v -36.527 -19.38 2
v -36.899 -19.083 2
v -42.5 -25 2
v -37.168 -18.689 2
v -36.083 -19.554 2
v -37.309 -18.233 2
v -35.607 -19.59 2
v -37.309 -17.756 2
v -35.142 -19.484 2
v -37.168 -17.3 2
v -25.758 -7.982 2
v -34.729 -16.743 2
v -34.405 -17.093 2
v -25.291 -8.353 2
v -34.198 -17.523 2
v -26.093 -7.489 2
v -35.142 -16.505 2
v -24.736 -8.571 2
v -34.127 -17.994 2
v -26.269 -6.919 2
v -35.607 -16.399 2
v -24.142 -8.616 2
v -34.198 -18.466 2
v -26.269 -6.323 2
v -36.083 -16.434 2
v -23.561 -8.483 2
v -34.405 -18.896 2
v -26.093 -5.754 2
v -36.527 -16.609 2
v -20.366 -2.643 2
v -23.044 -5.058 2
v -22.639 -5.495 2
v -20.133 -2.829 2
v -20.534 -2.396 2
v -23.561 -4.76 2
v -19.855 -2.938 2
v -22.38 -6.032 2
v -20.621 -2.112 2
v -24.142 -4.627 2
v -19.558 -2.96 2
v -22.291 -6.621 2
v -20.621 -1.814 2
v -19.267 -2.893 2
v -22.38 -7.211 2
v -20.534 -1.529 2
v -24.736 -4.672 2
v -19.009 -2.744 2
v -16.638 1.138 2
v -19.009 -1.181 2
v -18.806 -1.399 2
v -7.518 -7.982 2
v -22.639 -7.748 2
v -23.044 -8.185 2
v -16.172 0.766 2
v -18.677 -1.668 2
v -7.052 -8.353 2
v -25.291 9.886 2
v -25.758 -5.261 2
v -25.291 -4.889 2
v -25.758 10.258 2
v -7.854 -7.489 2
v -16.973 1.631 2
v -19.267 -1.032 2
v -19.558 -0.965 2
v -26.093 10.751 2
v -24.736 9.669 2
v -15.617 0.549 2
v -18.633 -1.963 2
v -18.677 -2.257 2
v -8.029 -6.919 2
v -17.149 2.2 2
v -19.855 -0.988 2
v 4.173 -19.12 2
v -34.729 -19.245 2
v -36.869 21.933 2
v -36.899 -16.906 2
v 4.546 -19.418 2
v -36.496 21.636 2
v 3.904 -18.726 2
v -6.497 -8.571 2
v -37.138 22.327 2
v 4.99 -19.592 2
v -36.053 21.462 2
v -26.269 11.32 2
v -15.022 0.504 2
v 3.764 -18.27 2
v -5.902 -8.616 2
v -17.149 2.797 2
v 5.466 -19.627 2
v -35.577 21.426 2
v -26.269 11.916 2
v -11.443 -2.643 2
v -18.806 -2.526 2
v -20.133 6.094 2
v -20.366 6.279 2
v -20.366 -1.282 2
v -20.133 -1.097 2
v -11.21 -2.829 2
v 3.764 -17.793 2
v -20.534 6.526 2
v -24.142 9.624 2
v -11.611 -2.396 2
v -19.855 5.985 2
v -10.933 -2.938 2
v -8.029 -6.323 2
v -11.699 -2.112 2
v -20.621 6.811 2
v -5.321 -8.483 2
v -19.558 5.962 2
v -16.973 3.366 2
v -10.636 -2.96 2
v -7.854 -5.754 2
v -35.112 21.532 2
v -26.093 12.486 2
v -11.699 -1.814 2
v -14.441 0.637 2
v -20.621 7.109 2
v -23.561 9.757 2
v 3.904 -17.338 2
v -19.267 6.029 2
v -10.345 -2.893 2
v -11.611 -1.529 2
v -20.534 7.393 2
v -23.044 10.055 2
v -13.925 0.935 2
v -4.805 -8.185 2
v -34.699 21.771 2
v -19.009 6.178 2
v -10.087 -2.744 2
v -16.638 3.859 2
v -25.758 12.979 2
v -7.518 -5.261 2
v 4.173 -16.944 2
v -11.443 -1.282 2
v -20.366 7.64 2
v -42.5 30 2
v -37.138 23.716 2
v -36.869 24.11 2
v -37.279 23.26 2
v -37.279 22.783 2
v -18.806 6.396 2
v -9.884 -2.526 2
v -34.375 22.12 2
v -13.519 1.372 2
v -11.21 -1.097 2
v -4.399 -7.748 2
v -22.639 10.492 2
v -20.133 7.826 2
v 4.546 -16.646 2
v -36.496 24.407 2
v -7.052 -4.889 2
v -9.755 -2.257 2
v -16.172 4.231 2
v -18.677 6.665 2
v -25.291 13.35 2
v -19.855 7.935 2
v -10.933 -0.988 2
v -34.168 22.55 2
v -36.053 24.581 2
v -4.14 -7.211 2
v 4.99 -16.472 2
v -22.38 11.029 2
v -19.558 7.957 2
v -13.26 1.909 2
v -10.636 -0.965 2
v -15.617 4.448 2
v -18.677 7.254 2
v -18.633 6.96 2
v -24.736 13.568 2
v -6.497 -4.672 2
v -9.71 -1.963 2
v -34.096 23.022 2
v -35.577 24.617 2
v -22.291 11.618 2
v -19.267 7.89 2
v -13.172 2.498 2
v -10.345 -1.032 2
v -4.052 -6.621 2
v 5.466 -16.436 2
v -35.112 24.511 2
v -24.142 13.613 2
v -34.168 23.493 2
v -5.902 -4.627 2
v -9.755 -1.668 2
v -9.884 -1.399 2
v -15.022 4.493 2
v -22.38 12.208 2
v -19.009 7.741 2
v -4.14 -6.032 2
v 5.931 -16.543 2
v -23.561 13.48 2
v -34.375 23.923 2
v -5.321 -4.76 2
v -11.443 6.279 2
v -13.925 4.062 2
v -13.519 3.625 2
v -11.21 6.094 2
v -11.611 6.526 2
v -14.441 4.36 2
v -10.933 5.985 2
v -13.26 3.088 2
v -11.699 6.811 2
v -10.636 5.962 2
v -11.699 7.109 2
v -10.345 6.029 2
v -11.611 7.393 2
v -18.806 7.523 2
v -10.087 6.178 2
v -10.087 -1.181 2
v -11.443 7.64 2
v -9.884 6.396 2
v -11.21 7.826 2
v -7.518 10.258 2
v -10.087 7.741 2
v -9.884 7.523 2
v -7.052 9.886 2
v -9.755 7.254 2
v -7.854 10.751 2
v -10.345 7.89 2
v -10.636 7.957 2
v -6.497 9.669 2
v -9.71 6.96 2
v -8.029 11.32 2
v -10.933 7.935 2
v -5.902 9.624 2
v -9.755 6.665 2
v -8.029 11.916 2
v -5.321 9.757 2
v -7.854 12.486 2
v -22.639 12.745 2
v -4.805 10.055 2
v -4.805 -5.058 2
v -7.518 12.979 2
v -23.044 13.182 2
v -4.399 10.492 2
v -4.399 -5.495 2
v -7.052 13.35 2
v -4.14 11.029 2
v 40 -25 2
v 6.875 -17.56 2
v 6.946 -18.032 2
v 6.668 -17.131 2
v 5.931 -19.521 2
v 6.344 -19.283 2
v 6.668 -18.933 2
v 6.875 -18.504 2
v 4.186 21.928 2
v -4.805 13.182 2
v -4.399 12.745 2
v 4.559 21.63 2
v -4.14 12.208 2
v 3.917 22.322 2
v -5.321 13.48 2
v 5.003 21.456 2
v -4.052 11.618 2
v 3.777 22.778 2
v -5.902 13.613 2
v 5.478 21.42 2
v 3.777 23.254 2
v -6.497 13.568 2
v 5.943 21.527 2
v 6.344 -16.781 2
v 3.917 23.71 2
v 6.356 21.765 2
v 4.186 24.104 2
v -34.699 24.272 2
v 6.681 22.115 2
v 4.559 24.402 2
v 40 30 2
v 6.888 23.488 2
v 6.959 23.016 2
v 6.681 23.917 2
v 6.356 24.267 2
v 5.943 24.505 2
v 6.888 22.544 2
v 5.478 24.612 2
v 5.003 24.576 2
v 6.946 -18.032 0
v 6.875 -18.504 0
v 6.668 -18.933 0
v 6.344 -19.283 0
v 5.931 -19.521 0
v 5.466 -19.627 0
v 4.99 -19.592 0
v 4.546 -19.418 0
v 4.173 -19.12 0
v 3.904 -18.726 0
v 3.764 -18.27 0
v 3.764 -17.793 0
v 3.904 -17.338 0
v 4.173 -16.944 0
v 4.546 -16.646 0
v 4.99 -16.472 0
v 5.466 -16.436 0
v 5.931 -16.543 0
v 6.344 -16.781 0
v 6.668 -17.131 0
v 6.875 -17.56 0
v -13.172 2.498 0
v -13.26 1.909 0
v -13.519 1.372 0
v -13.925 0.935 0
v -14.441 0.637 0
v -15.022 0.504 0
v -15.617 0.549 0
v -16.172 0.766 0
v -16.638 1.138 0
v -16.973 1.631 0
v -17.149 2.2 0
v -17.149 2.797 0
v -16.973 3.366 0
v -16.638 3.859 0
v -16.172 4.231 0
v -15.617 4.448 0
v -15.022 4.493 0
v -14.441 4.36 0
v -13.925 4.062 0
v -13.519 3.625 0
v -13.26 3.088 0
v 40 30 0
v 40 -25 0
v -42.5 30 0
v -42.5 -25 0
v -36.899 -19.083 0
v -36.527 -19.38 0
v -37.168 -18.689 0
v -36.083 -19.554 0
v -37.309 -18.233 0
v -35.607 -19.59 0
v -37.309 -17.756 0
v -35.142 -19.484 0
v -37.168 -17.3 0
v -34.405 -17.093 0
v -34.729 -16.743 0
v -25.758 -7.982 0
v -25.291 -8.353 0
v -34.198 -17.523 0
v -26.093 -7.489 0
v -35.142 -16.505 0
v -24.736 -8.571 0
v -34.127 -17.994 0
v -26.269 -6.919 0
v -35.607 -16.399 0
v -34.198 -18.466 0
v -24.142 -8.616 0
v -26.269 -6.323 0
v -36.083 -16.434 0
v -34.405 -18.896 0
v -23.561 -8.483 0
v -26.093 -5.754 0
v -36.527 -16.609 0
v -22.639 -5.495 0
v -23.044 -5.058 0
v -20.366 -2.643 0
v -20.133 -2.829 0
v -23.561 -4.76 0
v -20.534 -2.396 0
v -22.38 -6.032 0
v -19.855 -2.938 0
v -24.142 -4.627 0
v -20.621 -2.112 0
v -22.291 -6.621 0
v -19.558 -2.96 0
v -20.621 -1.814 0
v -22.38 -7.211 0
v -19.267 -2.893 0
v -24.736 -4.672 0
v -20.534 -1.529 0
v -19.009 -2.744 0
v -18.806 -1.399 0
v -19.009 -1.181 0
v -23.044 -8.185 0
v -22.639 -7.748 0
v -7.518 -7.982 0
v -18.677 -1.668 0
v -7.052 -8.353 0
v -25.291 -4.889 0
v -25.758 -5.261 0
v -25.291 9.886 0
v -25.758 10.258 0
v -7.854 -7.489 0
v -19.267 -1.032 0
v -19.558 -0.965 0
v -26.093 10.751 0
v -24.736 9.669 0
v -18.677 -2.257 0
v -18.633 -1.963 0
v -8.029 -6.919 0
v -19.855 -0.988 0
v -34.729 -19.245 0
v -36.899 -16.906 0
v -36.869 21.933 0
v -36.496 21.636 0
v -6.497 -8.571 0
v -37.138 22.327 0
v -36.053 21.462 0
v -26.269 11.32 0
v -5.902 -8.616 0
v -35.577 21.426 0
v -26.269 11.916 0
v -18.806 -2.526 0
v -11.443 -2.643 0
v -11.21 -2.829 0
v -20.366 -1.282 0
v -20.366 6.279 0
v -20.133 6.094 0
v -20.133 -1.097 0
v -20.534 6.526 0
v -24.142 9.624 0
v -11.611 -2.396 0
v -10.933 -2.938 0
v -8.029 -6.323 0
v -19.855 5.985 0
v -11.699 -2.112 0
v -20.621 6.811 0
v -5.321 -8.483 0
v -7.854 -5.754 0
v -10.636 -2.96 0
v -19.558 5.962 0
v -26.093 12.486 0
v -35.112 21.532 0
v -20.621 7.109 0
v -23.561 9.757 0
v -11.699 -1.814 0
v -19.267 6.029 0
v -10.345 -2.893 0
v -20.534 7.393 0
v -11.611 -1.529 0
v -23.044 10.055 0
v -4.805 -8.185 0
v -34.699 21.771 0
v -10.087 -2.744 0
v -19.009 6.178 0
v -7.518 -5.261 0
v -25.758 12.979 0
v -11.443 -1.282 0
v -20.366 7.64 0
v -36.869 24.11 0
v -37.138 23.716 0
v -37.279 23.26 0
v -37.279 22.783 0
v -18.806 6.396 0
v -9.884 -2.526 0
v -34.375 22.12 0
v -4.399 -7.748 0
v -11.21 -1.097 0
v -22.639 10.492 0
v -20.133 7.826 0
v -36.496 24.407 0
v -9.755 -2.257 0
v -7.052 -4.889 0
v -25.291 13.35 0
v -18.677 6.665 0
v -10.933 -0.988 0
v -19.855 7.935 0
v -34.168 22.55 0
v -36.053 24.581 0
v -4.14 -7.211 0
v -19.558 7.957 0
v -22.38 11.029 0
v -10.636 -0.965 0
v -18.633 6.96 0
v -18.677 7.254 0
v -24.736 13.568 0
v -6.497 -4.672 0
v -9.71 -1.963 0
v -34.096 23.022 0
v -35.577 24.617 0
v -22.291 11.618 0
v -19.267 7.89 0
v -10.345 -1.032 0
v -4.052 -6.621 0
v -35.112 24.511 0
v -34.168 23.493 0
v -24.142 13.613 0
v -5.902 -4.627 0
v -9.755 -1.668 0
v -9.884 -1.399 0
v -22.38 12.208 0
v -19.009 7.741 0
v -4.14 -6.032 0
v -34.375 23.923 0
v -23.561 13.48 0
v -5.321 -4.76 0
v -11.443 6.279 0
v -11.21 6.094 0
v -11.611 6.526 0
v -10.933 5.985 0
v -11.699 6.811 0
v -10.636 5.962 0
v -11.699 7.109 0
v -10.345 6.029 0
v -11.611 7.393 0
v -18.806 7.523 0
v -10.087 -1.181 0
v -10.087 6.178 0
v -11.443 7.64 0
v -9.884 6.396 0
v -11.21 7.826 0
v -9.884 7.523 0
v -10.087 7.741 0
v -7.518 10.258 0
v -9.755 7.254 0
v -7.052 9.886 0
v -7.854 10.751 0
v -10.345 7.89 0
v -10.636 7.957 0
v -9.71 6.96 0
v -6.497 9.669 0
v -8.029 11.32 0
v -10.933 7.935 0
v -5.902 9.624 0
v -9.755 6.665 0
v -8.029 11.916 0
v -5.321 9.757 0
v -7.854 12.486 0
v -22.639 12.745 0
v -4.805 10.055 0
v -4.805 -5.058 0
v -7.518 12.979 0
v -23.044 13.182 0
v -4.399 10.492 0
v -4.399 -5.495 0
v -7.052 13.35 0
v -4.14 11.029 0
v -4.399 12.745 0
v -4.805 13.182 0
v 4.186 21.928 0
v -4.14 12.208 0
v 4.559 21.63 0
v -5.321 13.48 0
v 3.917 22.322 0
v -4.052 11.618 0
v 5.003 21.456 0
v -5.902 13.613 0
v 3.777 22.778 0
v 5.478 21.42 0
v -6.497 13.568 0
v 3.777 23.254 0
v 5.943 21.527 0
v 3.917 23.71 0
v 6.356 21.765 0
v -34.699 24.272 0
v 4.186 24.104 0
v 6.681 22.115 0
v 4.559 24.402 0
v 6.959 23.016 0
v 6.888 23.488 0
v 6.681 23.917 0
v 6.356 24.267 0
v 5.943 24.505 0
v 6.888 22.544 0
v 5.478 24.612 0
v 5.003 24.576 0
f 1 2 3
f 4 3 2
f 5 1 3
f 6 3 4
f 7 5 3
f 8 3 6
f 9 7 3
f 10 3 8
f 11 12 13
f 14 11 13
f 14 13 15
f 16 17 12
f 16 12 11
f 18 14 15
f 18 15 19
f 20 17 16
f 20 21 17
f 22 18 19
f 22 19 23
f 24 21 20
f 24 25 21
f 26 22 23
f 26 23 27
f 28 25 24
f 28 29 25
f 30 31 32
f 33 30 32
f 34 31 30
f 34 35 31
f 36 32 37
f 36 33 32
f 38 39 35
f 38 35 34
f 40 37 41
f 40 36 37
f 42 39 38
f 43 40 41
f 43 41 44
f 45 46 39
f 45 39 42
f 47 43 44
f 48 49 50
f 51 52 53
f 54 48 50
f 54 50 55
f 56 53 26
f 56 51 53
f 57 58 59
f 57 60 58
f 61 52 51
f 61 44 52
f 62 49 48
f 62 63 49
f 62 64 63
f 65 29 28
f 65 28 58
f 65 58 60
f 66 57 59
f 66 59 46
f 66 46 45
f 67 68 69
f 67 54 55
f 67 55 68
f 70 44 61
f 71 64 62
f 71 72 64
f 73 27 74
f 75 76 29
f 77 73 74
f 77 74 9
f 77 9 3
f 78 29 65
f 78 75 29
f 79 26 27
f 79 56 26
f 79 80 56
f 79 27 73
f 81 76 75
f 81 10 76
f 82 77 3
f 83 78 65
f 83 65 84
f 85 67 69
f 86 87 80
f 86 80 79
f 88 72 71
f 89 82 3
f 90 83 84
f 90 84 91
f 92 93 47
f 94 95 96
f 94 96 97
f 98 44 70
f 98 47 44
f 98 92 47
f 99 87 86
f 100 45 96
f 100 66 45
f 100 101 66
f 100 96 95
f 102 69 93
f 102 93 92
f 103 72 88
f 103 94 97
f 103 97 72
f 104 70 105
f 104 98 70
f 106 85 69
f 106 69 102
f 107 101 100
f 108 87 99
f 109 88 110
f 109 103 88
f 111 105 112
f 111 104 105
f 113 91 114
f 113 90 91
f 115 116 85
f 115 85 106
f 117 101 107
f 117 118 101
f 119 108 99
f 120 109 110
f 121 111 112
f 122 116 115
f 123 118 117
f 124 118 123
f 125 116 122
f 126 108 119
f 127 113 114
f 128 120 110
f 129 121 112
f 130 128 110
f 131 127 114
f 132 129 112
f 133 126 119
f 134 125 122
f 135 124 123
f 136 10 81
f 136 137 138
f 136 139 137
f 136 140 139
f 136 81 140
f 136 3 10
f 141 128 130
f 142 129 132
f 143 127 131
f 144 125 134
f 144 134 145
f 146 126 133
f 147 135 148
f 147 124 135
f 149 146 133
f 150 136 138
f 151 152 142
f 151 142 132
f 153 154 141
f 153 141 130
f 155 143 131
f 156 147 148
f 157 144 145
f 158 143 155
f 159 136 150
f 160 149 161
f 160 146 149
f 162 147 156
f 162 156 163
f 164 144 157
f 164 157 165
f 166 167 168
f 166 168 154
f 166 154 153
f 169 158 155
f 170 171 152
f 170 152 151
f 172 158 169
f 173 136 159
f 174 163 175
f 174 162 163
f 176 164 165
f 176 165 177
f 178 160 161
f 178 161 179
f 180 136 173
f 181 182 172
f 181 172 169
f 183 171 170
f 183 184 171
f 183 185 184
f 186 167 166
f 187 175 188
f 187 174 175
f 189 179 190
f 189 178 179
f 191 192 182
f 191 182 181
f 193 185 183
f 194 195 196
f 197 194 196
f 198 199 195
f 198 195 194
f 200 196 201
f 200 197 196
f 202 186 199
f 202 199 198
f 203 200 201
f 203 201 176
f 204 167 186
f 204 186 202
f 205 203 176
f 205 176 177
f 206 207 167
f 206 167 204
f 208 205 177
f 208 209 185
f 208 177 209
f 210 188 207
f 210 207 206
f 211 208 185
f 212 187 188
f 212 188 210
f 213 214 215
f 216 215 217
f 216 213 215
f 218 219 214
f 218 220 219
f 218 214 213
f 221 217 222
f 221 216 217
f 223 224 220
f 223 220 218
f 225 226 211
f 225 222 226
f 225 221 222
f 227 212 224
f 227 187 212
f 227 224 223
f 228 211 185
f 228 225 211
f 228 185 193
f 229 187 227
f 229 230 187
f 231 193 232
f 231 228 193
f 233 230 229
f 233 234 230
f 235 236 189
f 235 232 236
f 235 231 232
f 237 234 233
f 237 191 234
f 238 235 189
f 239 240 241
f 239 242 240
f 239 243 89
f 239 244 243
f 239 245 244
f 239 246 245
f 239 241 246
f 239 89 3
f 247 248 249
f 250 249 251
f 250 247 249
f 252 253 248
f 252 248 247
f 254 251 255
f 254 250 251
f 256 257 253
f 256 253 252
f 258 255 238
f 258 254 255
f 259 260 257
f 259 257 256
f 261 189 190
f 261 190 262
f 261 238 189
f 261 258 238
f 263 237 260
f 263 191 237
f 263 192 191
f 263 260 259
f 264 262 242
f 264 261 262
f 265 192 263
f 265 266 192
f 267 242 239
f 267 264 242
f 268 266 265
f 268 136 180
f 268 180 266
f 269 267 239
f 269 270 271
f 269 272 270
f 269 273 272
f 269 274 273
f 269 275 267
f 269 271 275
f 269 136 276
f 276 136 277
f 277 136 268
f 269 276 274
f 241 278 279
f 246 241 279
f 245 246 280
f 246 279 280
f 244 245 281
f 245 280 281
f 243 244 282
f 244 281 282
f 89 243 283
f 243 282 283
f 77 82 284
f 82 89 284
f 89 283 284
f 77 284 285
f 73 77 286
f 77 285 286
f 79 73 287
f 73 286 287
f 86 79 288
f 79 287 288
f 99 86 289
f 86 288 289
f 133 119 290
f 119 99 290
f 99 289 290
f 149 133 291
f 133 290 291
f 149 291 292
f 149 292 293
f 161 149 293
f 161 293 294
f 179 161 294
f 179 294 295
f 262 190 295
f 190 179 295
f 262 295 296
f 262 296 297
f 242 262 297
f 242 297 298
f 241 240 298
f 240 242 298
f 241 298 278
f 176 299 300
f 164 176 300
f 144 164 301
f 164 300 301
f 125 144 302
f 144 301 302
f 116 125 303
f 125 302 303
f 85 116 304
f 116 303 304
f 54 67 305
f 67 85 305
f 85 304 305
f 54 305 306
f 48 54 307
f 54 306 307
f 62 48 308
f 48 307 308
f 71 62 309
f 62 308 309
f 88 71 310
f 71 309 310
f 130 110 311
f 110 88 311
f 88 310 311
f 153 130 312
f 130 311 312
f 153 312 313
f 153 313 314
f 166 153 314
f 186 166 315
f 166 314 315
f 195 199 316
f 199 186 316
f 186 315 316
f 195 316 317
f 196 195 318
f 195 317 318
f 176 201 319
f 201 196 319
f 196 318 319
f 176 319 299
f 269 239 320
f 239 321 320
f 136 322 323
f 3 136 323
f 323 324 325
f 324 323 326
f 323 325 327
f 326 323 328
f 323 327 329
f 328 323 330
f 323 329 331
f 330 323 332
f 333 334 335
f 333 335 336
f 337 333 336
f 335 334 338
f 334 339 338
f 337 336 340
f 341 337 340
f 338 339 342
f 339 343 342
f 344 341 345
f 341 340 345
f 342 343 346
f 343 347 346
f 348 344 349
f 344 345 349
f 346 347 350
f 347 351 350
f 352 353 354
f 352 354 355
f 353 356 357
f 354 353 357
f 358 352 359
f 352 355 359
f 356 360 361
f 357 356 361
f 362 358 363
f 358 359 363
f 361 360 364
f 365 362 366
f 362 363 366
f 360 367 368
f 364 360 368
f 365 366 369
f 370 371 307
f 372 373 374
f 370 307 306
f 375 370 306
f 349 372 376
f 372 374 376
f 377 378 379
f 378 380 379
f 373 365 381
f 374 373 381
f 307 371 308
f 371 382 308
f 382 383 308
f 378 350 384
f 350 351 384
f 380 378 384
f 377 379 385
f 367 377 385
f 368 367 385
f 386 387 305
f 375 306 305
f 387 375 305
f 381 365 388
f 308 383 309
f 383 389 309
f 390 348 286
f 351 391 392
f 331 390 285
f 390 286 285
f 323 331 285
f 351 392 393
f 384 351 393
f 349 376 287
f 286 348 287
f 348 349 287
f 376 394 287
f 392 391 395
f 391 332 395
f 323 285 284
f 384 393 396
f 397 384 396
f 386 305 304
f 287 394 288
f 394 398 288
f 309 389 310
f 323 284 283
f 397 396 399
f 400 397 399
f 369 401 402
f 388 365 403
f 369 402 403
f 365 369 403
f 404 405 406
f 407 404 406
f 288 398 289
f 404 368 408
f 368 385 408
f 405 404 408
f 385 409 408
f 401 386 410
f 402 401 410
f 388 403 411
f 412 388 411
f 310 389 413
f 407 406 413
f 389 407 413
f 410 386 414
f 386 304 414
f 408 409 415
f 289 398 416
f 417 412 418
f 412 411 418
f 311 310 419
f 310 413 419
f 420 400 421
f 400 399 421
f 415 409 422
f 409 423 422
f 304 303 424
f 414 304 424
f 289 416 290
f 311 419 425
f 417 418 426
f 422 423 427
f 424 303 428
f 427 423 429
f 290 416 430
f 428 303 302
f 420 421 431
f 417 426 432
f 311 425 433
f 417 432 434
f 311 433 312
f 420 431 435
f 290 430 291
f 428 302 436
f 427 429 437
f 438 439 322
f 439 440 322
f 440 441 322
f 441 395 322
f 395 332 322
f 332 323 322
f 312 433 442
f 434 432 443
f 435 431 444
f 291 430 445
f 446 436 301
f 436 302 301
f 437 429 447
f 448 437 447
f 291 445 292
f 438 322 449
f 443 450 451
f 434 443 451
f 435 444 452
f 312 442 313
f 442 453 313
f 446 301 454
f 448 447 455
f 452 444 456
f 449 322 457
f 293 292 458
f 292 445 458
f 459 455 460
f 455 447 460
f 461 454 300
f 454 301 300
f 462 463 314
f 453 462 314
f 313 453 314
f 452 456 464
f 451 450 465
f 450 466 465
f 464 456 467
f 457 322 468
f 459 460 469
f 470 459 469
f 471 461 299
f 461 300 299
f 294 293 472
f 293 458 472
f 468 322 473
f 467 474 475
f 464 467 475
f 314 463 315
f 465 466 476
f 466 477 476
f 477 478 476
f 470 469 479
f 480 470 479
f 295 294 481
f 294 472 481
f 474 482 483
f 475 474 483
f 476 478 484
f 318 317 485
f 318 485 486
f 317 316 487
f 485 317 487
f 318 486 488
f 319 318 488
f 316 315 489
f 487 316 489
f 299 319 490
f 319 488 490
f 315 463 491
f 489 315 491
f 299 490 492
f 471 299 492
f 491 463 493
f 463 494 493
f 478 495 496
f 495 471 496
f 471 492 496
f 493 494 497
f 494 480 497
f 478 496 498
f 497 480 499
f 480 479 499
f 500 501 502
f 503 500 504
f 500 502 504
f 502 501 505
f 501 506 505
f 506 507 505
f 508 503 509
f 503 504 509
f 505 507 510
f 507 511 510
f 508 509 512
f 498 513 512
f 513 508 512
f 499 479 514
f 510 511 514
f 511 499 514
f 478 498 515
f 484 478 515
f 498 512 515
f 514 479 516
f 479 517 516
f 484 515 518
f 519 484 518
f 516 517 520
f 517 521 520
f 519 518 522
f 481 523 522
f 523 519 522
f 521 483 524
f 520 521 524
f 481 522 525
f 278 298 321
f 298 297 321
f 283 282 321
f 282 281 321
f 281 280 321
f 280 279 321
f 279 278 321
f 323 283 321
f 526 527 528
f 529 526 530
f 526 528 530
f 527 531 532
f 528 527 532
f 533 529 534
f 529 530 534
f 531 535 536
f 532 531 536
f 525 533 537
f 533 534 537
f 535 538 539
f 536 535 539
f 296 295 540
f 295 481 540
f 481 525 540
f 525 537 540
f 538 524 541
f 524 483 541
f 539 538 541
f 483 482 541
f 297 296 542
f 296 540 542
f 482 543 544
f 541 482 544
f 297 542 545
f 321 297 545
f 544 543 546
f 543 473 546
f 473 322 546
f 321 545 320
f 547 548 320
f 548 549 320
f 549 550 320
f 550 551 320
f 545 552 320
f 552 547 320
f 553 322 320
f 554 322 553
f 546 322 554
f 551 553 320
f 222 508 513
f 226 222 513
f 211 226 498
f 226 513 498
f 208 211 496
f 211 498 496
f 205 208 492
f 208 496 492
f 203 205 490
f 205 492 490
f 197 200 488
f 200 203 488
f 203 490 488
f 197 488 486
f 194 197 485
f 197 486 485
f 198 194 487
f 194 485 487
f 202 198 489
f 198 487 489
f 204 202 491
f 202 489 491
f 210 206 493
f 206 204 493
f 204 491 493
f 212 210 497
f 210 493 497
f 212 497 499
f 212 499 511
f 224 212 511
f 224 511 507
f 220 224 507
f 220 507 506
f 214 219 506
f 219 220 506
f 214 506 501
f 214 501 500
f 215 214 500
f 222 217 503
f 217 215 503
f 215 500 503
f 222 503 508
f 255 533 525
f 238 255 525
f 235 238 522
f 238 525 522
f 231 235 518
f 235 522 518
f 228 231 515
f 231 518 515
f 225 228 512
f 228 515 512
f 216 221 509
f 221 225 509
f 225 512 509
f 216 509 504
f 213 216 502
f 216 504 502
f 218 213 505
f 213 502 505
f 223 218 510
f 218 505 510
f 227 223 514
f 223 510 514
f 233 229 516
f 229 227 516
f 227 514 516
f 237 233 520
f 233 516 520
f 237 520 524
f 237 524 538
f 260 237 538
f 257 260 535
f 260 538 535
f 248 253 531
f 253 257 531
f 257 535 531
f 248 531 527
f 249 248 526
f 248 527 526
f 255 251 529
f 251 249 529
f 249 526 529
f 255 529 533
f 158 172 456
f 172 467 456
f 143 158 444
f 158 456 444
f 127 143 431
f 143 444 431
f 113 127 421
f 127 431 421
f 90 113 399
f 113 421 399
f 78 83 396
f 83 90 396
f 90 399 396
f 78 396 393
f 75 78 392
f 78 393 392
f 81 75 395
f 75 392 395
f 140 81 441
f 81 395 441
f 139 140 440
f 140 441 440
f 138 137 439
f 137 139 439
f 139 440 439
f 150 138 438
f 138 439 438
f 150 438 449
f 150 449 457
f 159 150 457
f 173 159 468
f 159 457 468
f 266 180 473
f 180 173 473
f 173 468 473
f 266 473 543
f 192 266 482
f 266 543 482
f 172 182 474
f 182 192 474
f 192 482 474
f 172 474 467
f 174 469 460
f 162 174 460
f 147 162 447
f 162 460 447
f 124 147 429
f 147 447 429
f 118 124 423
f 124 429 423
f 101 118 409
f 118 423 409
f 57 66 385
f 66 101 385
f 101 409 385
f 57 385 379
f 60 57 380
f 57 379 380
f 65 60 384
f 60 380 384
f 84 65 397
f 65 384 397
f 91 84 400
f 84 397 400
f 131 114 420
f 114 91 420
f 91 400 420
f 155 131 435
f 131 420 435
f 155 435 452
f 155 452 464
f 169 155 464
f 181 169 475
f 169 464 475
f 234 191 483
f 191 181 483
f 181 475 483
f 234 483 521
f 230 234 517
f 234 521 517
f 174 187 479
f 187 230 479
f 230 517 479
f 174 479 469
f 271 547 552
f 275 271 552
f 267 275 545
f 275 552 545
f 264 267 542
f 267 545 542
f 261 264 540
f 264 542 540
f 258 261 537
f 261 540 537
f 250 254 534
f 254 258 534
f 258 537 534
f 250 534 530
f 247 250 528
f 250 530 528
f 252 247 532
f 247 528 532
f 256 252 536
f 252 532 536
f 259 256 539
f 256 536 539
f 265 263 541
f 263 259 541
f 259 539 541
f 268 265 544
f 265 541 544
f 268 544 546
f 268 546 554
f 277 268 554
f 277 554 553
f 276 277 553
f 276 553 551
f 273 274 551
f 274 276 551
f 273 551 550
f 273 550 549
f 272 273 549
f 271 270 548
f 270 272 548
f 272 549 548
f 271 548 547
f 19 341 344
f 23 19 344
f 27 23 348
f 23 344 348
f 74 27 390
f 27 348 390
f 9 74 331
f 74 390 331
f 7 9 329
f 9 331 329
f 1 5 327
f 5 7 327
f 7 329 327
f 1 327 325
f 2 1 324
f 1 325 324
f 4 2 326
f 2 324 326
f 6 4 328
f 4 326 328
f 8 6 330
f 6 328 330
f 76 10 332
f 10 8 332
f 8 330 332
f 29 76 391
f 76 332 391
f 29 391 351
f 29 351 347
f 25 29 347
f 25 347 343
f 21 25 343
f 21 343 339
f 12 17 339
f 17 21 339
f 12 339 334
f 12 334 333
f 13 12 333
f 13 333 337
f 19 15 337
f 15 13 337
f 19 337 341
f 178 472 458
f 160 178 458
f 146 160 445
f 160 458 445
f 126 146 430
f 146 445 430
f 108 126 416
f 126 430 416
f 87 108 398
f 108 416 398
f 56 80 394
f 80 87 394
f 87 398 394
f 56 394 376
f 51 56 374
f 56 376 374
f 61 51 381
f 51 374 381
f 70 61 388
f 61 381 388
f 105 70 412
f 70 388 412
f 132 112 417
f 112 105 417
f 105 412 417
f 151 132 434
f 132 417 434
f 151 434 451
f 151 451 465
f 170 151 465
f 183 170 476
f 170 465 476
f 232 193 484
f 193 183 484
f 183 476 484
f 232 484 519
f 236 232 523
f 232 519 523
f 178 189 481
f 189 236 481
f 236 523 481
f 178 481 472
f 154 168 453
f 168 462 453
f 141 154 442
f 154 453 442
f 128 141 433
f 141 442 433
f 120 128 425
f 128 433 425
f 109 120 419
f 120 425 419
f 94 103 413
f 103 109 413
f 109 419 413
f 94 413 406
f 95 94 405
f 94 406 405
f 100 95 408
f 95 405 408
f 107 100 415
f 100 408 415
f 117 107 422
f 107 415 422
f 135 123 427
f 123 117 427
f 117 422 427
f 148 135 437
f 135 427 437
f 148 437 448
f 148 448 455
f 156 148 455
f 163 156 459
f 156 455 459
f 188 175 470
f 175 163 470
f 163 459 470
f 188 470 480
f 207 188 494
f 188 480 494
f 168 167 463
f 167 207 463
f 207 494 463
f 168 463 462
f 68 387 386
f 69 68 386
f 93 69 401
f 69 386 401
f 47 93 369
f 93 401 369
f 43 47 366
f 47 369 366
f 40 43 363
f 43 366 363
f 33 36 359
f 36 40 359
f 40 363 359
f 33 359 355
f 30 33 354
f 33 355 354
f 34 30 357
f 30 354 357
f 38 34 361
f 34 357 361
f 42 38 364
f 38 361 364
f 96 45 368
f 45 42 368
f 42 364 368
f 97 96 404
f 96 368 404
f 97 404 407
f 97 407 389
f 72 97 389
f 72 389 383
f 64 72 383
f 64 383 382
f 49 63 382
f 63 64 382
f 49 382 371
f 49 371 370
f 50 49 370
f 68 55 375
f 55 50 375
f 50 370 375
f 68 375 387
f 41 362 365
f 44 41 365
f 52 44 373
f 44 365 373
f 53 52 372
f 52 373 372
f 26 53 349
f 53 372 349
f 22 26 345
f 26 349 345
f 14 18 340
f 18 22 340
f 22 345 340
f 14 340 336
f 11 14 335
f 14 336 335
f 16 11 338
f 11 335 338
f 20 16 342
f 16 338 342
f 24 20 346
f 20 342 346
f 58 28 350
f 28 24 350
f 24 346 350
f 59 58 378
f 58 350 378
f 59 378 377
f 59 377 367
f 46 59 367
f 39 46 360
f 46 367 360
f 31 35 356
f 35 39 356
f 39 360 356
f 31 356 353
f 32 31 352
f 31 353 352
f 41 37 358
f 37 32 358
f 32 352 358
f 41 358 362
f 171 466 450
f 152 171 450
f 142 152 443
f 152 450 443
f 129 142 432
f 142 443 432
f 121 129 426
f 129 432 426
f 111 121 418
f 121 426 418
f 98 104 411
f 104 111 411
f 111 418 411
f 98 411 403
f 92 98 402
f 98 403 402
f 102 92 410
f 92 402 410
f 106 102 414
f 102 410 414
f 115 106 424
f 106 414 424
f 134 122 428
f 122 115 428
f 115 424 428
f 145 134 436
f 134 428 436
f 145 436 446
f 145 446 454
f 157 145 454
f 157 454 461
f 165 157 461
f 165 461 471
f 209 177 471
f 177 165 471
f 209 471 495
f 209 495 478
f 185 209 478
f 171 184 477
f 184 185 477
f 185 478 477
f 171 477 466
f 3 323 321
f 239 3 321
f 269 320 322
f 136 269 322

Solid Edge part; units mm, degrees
sketch "Sketch1" plane through (0, 0, 0) normal (0, 0, 1) x (1, 0, 0)
  line L0 (40, -25) -> (40, 30)
  line L1 (40, 30) -> (-42.5, 30)
  line L2 (-42.5, 30) -> (-42.5, -25)
  line L3 (-42.5, -25) -> (40, -25)
extrude "ExtrudedProtrusion_3" add sketch "Sketch1" along normal blind 2
sketch "Sketch2" plane through (0, 0, 0) normal (0, 0, 1) x (1, 0, 0)
  circle A0 centre (-35.6965, 23.0215) radius 1.6
  circle A1 centre (5.3589, 23.016) radius 1.6
  circle A2 centre (5.346, -18.0319) radius 1.6
  circle A3 centre (-35.7266, -17.9943) radius 1.6
  circle A4 centre (-24.2914, -6.6214) radius 2
  circle A5 centre (-19.6326, -1.9626) radius 1
  circle A6 centre (-6.0516, -6.6214) radius 2
  circle A7 centre (-10.7104, -1.9626) radius 1
  circle A8 centre (-15.1715, 2.4985) radius 2
  circle A9 centre (-10.7104, 6.9596) radius 1
  circle A10 centre (-6.0516, 11.6184) radius 2
  circle A11 centre (-19.6326, 6.9596) radius 1
  circle A12 centre (-24.2914, 11.6184) radius 2
  dimension "D1" = 4
  dimension "D2" = 4
  dimension "D3" = 4
  dimension "D4" = 4
  dimension "D5" = 4
  dimension "D6" = 2
  dimension "D7" = 2
  dimension "D8" = 2
  dimension "D9" = 2
  dimension "D10" = 3.2
  dimension "D11" = 3.2
  dimension "D12" = 3.2
  dimension "D13" = 3.2
  dimension "D14" = 41.0554
  dimension "D15" = 41.0158
  dimension "D16" = 41.0727
  dimension "D17" = 41.048
extrude "ExtrudedCutout_14" cut sketch "Sketch2" along normal blind 2
properties material "ABS Plastic, high impact"
